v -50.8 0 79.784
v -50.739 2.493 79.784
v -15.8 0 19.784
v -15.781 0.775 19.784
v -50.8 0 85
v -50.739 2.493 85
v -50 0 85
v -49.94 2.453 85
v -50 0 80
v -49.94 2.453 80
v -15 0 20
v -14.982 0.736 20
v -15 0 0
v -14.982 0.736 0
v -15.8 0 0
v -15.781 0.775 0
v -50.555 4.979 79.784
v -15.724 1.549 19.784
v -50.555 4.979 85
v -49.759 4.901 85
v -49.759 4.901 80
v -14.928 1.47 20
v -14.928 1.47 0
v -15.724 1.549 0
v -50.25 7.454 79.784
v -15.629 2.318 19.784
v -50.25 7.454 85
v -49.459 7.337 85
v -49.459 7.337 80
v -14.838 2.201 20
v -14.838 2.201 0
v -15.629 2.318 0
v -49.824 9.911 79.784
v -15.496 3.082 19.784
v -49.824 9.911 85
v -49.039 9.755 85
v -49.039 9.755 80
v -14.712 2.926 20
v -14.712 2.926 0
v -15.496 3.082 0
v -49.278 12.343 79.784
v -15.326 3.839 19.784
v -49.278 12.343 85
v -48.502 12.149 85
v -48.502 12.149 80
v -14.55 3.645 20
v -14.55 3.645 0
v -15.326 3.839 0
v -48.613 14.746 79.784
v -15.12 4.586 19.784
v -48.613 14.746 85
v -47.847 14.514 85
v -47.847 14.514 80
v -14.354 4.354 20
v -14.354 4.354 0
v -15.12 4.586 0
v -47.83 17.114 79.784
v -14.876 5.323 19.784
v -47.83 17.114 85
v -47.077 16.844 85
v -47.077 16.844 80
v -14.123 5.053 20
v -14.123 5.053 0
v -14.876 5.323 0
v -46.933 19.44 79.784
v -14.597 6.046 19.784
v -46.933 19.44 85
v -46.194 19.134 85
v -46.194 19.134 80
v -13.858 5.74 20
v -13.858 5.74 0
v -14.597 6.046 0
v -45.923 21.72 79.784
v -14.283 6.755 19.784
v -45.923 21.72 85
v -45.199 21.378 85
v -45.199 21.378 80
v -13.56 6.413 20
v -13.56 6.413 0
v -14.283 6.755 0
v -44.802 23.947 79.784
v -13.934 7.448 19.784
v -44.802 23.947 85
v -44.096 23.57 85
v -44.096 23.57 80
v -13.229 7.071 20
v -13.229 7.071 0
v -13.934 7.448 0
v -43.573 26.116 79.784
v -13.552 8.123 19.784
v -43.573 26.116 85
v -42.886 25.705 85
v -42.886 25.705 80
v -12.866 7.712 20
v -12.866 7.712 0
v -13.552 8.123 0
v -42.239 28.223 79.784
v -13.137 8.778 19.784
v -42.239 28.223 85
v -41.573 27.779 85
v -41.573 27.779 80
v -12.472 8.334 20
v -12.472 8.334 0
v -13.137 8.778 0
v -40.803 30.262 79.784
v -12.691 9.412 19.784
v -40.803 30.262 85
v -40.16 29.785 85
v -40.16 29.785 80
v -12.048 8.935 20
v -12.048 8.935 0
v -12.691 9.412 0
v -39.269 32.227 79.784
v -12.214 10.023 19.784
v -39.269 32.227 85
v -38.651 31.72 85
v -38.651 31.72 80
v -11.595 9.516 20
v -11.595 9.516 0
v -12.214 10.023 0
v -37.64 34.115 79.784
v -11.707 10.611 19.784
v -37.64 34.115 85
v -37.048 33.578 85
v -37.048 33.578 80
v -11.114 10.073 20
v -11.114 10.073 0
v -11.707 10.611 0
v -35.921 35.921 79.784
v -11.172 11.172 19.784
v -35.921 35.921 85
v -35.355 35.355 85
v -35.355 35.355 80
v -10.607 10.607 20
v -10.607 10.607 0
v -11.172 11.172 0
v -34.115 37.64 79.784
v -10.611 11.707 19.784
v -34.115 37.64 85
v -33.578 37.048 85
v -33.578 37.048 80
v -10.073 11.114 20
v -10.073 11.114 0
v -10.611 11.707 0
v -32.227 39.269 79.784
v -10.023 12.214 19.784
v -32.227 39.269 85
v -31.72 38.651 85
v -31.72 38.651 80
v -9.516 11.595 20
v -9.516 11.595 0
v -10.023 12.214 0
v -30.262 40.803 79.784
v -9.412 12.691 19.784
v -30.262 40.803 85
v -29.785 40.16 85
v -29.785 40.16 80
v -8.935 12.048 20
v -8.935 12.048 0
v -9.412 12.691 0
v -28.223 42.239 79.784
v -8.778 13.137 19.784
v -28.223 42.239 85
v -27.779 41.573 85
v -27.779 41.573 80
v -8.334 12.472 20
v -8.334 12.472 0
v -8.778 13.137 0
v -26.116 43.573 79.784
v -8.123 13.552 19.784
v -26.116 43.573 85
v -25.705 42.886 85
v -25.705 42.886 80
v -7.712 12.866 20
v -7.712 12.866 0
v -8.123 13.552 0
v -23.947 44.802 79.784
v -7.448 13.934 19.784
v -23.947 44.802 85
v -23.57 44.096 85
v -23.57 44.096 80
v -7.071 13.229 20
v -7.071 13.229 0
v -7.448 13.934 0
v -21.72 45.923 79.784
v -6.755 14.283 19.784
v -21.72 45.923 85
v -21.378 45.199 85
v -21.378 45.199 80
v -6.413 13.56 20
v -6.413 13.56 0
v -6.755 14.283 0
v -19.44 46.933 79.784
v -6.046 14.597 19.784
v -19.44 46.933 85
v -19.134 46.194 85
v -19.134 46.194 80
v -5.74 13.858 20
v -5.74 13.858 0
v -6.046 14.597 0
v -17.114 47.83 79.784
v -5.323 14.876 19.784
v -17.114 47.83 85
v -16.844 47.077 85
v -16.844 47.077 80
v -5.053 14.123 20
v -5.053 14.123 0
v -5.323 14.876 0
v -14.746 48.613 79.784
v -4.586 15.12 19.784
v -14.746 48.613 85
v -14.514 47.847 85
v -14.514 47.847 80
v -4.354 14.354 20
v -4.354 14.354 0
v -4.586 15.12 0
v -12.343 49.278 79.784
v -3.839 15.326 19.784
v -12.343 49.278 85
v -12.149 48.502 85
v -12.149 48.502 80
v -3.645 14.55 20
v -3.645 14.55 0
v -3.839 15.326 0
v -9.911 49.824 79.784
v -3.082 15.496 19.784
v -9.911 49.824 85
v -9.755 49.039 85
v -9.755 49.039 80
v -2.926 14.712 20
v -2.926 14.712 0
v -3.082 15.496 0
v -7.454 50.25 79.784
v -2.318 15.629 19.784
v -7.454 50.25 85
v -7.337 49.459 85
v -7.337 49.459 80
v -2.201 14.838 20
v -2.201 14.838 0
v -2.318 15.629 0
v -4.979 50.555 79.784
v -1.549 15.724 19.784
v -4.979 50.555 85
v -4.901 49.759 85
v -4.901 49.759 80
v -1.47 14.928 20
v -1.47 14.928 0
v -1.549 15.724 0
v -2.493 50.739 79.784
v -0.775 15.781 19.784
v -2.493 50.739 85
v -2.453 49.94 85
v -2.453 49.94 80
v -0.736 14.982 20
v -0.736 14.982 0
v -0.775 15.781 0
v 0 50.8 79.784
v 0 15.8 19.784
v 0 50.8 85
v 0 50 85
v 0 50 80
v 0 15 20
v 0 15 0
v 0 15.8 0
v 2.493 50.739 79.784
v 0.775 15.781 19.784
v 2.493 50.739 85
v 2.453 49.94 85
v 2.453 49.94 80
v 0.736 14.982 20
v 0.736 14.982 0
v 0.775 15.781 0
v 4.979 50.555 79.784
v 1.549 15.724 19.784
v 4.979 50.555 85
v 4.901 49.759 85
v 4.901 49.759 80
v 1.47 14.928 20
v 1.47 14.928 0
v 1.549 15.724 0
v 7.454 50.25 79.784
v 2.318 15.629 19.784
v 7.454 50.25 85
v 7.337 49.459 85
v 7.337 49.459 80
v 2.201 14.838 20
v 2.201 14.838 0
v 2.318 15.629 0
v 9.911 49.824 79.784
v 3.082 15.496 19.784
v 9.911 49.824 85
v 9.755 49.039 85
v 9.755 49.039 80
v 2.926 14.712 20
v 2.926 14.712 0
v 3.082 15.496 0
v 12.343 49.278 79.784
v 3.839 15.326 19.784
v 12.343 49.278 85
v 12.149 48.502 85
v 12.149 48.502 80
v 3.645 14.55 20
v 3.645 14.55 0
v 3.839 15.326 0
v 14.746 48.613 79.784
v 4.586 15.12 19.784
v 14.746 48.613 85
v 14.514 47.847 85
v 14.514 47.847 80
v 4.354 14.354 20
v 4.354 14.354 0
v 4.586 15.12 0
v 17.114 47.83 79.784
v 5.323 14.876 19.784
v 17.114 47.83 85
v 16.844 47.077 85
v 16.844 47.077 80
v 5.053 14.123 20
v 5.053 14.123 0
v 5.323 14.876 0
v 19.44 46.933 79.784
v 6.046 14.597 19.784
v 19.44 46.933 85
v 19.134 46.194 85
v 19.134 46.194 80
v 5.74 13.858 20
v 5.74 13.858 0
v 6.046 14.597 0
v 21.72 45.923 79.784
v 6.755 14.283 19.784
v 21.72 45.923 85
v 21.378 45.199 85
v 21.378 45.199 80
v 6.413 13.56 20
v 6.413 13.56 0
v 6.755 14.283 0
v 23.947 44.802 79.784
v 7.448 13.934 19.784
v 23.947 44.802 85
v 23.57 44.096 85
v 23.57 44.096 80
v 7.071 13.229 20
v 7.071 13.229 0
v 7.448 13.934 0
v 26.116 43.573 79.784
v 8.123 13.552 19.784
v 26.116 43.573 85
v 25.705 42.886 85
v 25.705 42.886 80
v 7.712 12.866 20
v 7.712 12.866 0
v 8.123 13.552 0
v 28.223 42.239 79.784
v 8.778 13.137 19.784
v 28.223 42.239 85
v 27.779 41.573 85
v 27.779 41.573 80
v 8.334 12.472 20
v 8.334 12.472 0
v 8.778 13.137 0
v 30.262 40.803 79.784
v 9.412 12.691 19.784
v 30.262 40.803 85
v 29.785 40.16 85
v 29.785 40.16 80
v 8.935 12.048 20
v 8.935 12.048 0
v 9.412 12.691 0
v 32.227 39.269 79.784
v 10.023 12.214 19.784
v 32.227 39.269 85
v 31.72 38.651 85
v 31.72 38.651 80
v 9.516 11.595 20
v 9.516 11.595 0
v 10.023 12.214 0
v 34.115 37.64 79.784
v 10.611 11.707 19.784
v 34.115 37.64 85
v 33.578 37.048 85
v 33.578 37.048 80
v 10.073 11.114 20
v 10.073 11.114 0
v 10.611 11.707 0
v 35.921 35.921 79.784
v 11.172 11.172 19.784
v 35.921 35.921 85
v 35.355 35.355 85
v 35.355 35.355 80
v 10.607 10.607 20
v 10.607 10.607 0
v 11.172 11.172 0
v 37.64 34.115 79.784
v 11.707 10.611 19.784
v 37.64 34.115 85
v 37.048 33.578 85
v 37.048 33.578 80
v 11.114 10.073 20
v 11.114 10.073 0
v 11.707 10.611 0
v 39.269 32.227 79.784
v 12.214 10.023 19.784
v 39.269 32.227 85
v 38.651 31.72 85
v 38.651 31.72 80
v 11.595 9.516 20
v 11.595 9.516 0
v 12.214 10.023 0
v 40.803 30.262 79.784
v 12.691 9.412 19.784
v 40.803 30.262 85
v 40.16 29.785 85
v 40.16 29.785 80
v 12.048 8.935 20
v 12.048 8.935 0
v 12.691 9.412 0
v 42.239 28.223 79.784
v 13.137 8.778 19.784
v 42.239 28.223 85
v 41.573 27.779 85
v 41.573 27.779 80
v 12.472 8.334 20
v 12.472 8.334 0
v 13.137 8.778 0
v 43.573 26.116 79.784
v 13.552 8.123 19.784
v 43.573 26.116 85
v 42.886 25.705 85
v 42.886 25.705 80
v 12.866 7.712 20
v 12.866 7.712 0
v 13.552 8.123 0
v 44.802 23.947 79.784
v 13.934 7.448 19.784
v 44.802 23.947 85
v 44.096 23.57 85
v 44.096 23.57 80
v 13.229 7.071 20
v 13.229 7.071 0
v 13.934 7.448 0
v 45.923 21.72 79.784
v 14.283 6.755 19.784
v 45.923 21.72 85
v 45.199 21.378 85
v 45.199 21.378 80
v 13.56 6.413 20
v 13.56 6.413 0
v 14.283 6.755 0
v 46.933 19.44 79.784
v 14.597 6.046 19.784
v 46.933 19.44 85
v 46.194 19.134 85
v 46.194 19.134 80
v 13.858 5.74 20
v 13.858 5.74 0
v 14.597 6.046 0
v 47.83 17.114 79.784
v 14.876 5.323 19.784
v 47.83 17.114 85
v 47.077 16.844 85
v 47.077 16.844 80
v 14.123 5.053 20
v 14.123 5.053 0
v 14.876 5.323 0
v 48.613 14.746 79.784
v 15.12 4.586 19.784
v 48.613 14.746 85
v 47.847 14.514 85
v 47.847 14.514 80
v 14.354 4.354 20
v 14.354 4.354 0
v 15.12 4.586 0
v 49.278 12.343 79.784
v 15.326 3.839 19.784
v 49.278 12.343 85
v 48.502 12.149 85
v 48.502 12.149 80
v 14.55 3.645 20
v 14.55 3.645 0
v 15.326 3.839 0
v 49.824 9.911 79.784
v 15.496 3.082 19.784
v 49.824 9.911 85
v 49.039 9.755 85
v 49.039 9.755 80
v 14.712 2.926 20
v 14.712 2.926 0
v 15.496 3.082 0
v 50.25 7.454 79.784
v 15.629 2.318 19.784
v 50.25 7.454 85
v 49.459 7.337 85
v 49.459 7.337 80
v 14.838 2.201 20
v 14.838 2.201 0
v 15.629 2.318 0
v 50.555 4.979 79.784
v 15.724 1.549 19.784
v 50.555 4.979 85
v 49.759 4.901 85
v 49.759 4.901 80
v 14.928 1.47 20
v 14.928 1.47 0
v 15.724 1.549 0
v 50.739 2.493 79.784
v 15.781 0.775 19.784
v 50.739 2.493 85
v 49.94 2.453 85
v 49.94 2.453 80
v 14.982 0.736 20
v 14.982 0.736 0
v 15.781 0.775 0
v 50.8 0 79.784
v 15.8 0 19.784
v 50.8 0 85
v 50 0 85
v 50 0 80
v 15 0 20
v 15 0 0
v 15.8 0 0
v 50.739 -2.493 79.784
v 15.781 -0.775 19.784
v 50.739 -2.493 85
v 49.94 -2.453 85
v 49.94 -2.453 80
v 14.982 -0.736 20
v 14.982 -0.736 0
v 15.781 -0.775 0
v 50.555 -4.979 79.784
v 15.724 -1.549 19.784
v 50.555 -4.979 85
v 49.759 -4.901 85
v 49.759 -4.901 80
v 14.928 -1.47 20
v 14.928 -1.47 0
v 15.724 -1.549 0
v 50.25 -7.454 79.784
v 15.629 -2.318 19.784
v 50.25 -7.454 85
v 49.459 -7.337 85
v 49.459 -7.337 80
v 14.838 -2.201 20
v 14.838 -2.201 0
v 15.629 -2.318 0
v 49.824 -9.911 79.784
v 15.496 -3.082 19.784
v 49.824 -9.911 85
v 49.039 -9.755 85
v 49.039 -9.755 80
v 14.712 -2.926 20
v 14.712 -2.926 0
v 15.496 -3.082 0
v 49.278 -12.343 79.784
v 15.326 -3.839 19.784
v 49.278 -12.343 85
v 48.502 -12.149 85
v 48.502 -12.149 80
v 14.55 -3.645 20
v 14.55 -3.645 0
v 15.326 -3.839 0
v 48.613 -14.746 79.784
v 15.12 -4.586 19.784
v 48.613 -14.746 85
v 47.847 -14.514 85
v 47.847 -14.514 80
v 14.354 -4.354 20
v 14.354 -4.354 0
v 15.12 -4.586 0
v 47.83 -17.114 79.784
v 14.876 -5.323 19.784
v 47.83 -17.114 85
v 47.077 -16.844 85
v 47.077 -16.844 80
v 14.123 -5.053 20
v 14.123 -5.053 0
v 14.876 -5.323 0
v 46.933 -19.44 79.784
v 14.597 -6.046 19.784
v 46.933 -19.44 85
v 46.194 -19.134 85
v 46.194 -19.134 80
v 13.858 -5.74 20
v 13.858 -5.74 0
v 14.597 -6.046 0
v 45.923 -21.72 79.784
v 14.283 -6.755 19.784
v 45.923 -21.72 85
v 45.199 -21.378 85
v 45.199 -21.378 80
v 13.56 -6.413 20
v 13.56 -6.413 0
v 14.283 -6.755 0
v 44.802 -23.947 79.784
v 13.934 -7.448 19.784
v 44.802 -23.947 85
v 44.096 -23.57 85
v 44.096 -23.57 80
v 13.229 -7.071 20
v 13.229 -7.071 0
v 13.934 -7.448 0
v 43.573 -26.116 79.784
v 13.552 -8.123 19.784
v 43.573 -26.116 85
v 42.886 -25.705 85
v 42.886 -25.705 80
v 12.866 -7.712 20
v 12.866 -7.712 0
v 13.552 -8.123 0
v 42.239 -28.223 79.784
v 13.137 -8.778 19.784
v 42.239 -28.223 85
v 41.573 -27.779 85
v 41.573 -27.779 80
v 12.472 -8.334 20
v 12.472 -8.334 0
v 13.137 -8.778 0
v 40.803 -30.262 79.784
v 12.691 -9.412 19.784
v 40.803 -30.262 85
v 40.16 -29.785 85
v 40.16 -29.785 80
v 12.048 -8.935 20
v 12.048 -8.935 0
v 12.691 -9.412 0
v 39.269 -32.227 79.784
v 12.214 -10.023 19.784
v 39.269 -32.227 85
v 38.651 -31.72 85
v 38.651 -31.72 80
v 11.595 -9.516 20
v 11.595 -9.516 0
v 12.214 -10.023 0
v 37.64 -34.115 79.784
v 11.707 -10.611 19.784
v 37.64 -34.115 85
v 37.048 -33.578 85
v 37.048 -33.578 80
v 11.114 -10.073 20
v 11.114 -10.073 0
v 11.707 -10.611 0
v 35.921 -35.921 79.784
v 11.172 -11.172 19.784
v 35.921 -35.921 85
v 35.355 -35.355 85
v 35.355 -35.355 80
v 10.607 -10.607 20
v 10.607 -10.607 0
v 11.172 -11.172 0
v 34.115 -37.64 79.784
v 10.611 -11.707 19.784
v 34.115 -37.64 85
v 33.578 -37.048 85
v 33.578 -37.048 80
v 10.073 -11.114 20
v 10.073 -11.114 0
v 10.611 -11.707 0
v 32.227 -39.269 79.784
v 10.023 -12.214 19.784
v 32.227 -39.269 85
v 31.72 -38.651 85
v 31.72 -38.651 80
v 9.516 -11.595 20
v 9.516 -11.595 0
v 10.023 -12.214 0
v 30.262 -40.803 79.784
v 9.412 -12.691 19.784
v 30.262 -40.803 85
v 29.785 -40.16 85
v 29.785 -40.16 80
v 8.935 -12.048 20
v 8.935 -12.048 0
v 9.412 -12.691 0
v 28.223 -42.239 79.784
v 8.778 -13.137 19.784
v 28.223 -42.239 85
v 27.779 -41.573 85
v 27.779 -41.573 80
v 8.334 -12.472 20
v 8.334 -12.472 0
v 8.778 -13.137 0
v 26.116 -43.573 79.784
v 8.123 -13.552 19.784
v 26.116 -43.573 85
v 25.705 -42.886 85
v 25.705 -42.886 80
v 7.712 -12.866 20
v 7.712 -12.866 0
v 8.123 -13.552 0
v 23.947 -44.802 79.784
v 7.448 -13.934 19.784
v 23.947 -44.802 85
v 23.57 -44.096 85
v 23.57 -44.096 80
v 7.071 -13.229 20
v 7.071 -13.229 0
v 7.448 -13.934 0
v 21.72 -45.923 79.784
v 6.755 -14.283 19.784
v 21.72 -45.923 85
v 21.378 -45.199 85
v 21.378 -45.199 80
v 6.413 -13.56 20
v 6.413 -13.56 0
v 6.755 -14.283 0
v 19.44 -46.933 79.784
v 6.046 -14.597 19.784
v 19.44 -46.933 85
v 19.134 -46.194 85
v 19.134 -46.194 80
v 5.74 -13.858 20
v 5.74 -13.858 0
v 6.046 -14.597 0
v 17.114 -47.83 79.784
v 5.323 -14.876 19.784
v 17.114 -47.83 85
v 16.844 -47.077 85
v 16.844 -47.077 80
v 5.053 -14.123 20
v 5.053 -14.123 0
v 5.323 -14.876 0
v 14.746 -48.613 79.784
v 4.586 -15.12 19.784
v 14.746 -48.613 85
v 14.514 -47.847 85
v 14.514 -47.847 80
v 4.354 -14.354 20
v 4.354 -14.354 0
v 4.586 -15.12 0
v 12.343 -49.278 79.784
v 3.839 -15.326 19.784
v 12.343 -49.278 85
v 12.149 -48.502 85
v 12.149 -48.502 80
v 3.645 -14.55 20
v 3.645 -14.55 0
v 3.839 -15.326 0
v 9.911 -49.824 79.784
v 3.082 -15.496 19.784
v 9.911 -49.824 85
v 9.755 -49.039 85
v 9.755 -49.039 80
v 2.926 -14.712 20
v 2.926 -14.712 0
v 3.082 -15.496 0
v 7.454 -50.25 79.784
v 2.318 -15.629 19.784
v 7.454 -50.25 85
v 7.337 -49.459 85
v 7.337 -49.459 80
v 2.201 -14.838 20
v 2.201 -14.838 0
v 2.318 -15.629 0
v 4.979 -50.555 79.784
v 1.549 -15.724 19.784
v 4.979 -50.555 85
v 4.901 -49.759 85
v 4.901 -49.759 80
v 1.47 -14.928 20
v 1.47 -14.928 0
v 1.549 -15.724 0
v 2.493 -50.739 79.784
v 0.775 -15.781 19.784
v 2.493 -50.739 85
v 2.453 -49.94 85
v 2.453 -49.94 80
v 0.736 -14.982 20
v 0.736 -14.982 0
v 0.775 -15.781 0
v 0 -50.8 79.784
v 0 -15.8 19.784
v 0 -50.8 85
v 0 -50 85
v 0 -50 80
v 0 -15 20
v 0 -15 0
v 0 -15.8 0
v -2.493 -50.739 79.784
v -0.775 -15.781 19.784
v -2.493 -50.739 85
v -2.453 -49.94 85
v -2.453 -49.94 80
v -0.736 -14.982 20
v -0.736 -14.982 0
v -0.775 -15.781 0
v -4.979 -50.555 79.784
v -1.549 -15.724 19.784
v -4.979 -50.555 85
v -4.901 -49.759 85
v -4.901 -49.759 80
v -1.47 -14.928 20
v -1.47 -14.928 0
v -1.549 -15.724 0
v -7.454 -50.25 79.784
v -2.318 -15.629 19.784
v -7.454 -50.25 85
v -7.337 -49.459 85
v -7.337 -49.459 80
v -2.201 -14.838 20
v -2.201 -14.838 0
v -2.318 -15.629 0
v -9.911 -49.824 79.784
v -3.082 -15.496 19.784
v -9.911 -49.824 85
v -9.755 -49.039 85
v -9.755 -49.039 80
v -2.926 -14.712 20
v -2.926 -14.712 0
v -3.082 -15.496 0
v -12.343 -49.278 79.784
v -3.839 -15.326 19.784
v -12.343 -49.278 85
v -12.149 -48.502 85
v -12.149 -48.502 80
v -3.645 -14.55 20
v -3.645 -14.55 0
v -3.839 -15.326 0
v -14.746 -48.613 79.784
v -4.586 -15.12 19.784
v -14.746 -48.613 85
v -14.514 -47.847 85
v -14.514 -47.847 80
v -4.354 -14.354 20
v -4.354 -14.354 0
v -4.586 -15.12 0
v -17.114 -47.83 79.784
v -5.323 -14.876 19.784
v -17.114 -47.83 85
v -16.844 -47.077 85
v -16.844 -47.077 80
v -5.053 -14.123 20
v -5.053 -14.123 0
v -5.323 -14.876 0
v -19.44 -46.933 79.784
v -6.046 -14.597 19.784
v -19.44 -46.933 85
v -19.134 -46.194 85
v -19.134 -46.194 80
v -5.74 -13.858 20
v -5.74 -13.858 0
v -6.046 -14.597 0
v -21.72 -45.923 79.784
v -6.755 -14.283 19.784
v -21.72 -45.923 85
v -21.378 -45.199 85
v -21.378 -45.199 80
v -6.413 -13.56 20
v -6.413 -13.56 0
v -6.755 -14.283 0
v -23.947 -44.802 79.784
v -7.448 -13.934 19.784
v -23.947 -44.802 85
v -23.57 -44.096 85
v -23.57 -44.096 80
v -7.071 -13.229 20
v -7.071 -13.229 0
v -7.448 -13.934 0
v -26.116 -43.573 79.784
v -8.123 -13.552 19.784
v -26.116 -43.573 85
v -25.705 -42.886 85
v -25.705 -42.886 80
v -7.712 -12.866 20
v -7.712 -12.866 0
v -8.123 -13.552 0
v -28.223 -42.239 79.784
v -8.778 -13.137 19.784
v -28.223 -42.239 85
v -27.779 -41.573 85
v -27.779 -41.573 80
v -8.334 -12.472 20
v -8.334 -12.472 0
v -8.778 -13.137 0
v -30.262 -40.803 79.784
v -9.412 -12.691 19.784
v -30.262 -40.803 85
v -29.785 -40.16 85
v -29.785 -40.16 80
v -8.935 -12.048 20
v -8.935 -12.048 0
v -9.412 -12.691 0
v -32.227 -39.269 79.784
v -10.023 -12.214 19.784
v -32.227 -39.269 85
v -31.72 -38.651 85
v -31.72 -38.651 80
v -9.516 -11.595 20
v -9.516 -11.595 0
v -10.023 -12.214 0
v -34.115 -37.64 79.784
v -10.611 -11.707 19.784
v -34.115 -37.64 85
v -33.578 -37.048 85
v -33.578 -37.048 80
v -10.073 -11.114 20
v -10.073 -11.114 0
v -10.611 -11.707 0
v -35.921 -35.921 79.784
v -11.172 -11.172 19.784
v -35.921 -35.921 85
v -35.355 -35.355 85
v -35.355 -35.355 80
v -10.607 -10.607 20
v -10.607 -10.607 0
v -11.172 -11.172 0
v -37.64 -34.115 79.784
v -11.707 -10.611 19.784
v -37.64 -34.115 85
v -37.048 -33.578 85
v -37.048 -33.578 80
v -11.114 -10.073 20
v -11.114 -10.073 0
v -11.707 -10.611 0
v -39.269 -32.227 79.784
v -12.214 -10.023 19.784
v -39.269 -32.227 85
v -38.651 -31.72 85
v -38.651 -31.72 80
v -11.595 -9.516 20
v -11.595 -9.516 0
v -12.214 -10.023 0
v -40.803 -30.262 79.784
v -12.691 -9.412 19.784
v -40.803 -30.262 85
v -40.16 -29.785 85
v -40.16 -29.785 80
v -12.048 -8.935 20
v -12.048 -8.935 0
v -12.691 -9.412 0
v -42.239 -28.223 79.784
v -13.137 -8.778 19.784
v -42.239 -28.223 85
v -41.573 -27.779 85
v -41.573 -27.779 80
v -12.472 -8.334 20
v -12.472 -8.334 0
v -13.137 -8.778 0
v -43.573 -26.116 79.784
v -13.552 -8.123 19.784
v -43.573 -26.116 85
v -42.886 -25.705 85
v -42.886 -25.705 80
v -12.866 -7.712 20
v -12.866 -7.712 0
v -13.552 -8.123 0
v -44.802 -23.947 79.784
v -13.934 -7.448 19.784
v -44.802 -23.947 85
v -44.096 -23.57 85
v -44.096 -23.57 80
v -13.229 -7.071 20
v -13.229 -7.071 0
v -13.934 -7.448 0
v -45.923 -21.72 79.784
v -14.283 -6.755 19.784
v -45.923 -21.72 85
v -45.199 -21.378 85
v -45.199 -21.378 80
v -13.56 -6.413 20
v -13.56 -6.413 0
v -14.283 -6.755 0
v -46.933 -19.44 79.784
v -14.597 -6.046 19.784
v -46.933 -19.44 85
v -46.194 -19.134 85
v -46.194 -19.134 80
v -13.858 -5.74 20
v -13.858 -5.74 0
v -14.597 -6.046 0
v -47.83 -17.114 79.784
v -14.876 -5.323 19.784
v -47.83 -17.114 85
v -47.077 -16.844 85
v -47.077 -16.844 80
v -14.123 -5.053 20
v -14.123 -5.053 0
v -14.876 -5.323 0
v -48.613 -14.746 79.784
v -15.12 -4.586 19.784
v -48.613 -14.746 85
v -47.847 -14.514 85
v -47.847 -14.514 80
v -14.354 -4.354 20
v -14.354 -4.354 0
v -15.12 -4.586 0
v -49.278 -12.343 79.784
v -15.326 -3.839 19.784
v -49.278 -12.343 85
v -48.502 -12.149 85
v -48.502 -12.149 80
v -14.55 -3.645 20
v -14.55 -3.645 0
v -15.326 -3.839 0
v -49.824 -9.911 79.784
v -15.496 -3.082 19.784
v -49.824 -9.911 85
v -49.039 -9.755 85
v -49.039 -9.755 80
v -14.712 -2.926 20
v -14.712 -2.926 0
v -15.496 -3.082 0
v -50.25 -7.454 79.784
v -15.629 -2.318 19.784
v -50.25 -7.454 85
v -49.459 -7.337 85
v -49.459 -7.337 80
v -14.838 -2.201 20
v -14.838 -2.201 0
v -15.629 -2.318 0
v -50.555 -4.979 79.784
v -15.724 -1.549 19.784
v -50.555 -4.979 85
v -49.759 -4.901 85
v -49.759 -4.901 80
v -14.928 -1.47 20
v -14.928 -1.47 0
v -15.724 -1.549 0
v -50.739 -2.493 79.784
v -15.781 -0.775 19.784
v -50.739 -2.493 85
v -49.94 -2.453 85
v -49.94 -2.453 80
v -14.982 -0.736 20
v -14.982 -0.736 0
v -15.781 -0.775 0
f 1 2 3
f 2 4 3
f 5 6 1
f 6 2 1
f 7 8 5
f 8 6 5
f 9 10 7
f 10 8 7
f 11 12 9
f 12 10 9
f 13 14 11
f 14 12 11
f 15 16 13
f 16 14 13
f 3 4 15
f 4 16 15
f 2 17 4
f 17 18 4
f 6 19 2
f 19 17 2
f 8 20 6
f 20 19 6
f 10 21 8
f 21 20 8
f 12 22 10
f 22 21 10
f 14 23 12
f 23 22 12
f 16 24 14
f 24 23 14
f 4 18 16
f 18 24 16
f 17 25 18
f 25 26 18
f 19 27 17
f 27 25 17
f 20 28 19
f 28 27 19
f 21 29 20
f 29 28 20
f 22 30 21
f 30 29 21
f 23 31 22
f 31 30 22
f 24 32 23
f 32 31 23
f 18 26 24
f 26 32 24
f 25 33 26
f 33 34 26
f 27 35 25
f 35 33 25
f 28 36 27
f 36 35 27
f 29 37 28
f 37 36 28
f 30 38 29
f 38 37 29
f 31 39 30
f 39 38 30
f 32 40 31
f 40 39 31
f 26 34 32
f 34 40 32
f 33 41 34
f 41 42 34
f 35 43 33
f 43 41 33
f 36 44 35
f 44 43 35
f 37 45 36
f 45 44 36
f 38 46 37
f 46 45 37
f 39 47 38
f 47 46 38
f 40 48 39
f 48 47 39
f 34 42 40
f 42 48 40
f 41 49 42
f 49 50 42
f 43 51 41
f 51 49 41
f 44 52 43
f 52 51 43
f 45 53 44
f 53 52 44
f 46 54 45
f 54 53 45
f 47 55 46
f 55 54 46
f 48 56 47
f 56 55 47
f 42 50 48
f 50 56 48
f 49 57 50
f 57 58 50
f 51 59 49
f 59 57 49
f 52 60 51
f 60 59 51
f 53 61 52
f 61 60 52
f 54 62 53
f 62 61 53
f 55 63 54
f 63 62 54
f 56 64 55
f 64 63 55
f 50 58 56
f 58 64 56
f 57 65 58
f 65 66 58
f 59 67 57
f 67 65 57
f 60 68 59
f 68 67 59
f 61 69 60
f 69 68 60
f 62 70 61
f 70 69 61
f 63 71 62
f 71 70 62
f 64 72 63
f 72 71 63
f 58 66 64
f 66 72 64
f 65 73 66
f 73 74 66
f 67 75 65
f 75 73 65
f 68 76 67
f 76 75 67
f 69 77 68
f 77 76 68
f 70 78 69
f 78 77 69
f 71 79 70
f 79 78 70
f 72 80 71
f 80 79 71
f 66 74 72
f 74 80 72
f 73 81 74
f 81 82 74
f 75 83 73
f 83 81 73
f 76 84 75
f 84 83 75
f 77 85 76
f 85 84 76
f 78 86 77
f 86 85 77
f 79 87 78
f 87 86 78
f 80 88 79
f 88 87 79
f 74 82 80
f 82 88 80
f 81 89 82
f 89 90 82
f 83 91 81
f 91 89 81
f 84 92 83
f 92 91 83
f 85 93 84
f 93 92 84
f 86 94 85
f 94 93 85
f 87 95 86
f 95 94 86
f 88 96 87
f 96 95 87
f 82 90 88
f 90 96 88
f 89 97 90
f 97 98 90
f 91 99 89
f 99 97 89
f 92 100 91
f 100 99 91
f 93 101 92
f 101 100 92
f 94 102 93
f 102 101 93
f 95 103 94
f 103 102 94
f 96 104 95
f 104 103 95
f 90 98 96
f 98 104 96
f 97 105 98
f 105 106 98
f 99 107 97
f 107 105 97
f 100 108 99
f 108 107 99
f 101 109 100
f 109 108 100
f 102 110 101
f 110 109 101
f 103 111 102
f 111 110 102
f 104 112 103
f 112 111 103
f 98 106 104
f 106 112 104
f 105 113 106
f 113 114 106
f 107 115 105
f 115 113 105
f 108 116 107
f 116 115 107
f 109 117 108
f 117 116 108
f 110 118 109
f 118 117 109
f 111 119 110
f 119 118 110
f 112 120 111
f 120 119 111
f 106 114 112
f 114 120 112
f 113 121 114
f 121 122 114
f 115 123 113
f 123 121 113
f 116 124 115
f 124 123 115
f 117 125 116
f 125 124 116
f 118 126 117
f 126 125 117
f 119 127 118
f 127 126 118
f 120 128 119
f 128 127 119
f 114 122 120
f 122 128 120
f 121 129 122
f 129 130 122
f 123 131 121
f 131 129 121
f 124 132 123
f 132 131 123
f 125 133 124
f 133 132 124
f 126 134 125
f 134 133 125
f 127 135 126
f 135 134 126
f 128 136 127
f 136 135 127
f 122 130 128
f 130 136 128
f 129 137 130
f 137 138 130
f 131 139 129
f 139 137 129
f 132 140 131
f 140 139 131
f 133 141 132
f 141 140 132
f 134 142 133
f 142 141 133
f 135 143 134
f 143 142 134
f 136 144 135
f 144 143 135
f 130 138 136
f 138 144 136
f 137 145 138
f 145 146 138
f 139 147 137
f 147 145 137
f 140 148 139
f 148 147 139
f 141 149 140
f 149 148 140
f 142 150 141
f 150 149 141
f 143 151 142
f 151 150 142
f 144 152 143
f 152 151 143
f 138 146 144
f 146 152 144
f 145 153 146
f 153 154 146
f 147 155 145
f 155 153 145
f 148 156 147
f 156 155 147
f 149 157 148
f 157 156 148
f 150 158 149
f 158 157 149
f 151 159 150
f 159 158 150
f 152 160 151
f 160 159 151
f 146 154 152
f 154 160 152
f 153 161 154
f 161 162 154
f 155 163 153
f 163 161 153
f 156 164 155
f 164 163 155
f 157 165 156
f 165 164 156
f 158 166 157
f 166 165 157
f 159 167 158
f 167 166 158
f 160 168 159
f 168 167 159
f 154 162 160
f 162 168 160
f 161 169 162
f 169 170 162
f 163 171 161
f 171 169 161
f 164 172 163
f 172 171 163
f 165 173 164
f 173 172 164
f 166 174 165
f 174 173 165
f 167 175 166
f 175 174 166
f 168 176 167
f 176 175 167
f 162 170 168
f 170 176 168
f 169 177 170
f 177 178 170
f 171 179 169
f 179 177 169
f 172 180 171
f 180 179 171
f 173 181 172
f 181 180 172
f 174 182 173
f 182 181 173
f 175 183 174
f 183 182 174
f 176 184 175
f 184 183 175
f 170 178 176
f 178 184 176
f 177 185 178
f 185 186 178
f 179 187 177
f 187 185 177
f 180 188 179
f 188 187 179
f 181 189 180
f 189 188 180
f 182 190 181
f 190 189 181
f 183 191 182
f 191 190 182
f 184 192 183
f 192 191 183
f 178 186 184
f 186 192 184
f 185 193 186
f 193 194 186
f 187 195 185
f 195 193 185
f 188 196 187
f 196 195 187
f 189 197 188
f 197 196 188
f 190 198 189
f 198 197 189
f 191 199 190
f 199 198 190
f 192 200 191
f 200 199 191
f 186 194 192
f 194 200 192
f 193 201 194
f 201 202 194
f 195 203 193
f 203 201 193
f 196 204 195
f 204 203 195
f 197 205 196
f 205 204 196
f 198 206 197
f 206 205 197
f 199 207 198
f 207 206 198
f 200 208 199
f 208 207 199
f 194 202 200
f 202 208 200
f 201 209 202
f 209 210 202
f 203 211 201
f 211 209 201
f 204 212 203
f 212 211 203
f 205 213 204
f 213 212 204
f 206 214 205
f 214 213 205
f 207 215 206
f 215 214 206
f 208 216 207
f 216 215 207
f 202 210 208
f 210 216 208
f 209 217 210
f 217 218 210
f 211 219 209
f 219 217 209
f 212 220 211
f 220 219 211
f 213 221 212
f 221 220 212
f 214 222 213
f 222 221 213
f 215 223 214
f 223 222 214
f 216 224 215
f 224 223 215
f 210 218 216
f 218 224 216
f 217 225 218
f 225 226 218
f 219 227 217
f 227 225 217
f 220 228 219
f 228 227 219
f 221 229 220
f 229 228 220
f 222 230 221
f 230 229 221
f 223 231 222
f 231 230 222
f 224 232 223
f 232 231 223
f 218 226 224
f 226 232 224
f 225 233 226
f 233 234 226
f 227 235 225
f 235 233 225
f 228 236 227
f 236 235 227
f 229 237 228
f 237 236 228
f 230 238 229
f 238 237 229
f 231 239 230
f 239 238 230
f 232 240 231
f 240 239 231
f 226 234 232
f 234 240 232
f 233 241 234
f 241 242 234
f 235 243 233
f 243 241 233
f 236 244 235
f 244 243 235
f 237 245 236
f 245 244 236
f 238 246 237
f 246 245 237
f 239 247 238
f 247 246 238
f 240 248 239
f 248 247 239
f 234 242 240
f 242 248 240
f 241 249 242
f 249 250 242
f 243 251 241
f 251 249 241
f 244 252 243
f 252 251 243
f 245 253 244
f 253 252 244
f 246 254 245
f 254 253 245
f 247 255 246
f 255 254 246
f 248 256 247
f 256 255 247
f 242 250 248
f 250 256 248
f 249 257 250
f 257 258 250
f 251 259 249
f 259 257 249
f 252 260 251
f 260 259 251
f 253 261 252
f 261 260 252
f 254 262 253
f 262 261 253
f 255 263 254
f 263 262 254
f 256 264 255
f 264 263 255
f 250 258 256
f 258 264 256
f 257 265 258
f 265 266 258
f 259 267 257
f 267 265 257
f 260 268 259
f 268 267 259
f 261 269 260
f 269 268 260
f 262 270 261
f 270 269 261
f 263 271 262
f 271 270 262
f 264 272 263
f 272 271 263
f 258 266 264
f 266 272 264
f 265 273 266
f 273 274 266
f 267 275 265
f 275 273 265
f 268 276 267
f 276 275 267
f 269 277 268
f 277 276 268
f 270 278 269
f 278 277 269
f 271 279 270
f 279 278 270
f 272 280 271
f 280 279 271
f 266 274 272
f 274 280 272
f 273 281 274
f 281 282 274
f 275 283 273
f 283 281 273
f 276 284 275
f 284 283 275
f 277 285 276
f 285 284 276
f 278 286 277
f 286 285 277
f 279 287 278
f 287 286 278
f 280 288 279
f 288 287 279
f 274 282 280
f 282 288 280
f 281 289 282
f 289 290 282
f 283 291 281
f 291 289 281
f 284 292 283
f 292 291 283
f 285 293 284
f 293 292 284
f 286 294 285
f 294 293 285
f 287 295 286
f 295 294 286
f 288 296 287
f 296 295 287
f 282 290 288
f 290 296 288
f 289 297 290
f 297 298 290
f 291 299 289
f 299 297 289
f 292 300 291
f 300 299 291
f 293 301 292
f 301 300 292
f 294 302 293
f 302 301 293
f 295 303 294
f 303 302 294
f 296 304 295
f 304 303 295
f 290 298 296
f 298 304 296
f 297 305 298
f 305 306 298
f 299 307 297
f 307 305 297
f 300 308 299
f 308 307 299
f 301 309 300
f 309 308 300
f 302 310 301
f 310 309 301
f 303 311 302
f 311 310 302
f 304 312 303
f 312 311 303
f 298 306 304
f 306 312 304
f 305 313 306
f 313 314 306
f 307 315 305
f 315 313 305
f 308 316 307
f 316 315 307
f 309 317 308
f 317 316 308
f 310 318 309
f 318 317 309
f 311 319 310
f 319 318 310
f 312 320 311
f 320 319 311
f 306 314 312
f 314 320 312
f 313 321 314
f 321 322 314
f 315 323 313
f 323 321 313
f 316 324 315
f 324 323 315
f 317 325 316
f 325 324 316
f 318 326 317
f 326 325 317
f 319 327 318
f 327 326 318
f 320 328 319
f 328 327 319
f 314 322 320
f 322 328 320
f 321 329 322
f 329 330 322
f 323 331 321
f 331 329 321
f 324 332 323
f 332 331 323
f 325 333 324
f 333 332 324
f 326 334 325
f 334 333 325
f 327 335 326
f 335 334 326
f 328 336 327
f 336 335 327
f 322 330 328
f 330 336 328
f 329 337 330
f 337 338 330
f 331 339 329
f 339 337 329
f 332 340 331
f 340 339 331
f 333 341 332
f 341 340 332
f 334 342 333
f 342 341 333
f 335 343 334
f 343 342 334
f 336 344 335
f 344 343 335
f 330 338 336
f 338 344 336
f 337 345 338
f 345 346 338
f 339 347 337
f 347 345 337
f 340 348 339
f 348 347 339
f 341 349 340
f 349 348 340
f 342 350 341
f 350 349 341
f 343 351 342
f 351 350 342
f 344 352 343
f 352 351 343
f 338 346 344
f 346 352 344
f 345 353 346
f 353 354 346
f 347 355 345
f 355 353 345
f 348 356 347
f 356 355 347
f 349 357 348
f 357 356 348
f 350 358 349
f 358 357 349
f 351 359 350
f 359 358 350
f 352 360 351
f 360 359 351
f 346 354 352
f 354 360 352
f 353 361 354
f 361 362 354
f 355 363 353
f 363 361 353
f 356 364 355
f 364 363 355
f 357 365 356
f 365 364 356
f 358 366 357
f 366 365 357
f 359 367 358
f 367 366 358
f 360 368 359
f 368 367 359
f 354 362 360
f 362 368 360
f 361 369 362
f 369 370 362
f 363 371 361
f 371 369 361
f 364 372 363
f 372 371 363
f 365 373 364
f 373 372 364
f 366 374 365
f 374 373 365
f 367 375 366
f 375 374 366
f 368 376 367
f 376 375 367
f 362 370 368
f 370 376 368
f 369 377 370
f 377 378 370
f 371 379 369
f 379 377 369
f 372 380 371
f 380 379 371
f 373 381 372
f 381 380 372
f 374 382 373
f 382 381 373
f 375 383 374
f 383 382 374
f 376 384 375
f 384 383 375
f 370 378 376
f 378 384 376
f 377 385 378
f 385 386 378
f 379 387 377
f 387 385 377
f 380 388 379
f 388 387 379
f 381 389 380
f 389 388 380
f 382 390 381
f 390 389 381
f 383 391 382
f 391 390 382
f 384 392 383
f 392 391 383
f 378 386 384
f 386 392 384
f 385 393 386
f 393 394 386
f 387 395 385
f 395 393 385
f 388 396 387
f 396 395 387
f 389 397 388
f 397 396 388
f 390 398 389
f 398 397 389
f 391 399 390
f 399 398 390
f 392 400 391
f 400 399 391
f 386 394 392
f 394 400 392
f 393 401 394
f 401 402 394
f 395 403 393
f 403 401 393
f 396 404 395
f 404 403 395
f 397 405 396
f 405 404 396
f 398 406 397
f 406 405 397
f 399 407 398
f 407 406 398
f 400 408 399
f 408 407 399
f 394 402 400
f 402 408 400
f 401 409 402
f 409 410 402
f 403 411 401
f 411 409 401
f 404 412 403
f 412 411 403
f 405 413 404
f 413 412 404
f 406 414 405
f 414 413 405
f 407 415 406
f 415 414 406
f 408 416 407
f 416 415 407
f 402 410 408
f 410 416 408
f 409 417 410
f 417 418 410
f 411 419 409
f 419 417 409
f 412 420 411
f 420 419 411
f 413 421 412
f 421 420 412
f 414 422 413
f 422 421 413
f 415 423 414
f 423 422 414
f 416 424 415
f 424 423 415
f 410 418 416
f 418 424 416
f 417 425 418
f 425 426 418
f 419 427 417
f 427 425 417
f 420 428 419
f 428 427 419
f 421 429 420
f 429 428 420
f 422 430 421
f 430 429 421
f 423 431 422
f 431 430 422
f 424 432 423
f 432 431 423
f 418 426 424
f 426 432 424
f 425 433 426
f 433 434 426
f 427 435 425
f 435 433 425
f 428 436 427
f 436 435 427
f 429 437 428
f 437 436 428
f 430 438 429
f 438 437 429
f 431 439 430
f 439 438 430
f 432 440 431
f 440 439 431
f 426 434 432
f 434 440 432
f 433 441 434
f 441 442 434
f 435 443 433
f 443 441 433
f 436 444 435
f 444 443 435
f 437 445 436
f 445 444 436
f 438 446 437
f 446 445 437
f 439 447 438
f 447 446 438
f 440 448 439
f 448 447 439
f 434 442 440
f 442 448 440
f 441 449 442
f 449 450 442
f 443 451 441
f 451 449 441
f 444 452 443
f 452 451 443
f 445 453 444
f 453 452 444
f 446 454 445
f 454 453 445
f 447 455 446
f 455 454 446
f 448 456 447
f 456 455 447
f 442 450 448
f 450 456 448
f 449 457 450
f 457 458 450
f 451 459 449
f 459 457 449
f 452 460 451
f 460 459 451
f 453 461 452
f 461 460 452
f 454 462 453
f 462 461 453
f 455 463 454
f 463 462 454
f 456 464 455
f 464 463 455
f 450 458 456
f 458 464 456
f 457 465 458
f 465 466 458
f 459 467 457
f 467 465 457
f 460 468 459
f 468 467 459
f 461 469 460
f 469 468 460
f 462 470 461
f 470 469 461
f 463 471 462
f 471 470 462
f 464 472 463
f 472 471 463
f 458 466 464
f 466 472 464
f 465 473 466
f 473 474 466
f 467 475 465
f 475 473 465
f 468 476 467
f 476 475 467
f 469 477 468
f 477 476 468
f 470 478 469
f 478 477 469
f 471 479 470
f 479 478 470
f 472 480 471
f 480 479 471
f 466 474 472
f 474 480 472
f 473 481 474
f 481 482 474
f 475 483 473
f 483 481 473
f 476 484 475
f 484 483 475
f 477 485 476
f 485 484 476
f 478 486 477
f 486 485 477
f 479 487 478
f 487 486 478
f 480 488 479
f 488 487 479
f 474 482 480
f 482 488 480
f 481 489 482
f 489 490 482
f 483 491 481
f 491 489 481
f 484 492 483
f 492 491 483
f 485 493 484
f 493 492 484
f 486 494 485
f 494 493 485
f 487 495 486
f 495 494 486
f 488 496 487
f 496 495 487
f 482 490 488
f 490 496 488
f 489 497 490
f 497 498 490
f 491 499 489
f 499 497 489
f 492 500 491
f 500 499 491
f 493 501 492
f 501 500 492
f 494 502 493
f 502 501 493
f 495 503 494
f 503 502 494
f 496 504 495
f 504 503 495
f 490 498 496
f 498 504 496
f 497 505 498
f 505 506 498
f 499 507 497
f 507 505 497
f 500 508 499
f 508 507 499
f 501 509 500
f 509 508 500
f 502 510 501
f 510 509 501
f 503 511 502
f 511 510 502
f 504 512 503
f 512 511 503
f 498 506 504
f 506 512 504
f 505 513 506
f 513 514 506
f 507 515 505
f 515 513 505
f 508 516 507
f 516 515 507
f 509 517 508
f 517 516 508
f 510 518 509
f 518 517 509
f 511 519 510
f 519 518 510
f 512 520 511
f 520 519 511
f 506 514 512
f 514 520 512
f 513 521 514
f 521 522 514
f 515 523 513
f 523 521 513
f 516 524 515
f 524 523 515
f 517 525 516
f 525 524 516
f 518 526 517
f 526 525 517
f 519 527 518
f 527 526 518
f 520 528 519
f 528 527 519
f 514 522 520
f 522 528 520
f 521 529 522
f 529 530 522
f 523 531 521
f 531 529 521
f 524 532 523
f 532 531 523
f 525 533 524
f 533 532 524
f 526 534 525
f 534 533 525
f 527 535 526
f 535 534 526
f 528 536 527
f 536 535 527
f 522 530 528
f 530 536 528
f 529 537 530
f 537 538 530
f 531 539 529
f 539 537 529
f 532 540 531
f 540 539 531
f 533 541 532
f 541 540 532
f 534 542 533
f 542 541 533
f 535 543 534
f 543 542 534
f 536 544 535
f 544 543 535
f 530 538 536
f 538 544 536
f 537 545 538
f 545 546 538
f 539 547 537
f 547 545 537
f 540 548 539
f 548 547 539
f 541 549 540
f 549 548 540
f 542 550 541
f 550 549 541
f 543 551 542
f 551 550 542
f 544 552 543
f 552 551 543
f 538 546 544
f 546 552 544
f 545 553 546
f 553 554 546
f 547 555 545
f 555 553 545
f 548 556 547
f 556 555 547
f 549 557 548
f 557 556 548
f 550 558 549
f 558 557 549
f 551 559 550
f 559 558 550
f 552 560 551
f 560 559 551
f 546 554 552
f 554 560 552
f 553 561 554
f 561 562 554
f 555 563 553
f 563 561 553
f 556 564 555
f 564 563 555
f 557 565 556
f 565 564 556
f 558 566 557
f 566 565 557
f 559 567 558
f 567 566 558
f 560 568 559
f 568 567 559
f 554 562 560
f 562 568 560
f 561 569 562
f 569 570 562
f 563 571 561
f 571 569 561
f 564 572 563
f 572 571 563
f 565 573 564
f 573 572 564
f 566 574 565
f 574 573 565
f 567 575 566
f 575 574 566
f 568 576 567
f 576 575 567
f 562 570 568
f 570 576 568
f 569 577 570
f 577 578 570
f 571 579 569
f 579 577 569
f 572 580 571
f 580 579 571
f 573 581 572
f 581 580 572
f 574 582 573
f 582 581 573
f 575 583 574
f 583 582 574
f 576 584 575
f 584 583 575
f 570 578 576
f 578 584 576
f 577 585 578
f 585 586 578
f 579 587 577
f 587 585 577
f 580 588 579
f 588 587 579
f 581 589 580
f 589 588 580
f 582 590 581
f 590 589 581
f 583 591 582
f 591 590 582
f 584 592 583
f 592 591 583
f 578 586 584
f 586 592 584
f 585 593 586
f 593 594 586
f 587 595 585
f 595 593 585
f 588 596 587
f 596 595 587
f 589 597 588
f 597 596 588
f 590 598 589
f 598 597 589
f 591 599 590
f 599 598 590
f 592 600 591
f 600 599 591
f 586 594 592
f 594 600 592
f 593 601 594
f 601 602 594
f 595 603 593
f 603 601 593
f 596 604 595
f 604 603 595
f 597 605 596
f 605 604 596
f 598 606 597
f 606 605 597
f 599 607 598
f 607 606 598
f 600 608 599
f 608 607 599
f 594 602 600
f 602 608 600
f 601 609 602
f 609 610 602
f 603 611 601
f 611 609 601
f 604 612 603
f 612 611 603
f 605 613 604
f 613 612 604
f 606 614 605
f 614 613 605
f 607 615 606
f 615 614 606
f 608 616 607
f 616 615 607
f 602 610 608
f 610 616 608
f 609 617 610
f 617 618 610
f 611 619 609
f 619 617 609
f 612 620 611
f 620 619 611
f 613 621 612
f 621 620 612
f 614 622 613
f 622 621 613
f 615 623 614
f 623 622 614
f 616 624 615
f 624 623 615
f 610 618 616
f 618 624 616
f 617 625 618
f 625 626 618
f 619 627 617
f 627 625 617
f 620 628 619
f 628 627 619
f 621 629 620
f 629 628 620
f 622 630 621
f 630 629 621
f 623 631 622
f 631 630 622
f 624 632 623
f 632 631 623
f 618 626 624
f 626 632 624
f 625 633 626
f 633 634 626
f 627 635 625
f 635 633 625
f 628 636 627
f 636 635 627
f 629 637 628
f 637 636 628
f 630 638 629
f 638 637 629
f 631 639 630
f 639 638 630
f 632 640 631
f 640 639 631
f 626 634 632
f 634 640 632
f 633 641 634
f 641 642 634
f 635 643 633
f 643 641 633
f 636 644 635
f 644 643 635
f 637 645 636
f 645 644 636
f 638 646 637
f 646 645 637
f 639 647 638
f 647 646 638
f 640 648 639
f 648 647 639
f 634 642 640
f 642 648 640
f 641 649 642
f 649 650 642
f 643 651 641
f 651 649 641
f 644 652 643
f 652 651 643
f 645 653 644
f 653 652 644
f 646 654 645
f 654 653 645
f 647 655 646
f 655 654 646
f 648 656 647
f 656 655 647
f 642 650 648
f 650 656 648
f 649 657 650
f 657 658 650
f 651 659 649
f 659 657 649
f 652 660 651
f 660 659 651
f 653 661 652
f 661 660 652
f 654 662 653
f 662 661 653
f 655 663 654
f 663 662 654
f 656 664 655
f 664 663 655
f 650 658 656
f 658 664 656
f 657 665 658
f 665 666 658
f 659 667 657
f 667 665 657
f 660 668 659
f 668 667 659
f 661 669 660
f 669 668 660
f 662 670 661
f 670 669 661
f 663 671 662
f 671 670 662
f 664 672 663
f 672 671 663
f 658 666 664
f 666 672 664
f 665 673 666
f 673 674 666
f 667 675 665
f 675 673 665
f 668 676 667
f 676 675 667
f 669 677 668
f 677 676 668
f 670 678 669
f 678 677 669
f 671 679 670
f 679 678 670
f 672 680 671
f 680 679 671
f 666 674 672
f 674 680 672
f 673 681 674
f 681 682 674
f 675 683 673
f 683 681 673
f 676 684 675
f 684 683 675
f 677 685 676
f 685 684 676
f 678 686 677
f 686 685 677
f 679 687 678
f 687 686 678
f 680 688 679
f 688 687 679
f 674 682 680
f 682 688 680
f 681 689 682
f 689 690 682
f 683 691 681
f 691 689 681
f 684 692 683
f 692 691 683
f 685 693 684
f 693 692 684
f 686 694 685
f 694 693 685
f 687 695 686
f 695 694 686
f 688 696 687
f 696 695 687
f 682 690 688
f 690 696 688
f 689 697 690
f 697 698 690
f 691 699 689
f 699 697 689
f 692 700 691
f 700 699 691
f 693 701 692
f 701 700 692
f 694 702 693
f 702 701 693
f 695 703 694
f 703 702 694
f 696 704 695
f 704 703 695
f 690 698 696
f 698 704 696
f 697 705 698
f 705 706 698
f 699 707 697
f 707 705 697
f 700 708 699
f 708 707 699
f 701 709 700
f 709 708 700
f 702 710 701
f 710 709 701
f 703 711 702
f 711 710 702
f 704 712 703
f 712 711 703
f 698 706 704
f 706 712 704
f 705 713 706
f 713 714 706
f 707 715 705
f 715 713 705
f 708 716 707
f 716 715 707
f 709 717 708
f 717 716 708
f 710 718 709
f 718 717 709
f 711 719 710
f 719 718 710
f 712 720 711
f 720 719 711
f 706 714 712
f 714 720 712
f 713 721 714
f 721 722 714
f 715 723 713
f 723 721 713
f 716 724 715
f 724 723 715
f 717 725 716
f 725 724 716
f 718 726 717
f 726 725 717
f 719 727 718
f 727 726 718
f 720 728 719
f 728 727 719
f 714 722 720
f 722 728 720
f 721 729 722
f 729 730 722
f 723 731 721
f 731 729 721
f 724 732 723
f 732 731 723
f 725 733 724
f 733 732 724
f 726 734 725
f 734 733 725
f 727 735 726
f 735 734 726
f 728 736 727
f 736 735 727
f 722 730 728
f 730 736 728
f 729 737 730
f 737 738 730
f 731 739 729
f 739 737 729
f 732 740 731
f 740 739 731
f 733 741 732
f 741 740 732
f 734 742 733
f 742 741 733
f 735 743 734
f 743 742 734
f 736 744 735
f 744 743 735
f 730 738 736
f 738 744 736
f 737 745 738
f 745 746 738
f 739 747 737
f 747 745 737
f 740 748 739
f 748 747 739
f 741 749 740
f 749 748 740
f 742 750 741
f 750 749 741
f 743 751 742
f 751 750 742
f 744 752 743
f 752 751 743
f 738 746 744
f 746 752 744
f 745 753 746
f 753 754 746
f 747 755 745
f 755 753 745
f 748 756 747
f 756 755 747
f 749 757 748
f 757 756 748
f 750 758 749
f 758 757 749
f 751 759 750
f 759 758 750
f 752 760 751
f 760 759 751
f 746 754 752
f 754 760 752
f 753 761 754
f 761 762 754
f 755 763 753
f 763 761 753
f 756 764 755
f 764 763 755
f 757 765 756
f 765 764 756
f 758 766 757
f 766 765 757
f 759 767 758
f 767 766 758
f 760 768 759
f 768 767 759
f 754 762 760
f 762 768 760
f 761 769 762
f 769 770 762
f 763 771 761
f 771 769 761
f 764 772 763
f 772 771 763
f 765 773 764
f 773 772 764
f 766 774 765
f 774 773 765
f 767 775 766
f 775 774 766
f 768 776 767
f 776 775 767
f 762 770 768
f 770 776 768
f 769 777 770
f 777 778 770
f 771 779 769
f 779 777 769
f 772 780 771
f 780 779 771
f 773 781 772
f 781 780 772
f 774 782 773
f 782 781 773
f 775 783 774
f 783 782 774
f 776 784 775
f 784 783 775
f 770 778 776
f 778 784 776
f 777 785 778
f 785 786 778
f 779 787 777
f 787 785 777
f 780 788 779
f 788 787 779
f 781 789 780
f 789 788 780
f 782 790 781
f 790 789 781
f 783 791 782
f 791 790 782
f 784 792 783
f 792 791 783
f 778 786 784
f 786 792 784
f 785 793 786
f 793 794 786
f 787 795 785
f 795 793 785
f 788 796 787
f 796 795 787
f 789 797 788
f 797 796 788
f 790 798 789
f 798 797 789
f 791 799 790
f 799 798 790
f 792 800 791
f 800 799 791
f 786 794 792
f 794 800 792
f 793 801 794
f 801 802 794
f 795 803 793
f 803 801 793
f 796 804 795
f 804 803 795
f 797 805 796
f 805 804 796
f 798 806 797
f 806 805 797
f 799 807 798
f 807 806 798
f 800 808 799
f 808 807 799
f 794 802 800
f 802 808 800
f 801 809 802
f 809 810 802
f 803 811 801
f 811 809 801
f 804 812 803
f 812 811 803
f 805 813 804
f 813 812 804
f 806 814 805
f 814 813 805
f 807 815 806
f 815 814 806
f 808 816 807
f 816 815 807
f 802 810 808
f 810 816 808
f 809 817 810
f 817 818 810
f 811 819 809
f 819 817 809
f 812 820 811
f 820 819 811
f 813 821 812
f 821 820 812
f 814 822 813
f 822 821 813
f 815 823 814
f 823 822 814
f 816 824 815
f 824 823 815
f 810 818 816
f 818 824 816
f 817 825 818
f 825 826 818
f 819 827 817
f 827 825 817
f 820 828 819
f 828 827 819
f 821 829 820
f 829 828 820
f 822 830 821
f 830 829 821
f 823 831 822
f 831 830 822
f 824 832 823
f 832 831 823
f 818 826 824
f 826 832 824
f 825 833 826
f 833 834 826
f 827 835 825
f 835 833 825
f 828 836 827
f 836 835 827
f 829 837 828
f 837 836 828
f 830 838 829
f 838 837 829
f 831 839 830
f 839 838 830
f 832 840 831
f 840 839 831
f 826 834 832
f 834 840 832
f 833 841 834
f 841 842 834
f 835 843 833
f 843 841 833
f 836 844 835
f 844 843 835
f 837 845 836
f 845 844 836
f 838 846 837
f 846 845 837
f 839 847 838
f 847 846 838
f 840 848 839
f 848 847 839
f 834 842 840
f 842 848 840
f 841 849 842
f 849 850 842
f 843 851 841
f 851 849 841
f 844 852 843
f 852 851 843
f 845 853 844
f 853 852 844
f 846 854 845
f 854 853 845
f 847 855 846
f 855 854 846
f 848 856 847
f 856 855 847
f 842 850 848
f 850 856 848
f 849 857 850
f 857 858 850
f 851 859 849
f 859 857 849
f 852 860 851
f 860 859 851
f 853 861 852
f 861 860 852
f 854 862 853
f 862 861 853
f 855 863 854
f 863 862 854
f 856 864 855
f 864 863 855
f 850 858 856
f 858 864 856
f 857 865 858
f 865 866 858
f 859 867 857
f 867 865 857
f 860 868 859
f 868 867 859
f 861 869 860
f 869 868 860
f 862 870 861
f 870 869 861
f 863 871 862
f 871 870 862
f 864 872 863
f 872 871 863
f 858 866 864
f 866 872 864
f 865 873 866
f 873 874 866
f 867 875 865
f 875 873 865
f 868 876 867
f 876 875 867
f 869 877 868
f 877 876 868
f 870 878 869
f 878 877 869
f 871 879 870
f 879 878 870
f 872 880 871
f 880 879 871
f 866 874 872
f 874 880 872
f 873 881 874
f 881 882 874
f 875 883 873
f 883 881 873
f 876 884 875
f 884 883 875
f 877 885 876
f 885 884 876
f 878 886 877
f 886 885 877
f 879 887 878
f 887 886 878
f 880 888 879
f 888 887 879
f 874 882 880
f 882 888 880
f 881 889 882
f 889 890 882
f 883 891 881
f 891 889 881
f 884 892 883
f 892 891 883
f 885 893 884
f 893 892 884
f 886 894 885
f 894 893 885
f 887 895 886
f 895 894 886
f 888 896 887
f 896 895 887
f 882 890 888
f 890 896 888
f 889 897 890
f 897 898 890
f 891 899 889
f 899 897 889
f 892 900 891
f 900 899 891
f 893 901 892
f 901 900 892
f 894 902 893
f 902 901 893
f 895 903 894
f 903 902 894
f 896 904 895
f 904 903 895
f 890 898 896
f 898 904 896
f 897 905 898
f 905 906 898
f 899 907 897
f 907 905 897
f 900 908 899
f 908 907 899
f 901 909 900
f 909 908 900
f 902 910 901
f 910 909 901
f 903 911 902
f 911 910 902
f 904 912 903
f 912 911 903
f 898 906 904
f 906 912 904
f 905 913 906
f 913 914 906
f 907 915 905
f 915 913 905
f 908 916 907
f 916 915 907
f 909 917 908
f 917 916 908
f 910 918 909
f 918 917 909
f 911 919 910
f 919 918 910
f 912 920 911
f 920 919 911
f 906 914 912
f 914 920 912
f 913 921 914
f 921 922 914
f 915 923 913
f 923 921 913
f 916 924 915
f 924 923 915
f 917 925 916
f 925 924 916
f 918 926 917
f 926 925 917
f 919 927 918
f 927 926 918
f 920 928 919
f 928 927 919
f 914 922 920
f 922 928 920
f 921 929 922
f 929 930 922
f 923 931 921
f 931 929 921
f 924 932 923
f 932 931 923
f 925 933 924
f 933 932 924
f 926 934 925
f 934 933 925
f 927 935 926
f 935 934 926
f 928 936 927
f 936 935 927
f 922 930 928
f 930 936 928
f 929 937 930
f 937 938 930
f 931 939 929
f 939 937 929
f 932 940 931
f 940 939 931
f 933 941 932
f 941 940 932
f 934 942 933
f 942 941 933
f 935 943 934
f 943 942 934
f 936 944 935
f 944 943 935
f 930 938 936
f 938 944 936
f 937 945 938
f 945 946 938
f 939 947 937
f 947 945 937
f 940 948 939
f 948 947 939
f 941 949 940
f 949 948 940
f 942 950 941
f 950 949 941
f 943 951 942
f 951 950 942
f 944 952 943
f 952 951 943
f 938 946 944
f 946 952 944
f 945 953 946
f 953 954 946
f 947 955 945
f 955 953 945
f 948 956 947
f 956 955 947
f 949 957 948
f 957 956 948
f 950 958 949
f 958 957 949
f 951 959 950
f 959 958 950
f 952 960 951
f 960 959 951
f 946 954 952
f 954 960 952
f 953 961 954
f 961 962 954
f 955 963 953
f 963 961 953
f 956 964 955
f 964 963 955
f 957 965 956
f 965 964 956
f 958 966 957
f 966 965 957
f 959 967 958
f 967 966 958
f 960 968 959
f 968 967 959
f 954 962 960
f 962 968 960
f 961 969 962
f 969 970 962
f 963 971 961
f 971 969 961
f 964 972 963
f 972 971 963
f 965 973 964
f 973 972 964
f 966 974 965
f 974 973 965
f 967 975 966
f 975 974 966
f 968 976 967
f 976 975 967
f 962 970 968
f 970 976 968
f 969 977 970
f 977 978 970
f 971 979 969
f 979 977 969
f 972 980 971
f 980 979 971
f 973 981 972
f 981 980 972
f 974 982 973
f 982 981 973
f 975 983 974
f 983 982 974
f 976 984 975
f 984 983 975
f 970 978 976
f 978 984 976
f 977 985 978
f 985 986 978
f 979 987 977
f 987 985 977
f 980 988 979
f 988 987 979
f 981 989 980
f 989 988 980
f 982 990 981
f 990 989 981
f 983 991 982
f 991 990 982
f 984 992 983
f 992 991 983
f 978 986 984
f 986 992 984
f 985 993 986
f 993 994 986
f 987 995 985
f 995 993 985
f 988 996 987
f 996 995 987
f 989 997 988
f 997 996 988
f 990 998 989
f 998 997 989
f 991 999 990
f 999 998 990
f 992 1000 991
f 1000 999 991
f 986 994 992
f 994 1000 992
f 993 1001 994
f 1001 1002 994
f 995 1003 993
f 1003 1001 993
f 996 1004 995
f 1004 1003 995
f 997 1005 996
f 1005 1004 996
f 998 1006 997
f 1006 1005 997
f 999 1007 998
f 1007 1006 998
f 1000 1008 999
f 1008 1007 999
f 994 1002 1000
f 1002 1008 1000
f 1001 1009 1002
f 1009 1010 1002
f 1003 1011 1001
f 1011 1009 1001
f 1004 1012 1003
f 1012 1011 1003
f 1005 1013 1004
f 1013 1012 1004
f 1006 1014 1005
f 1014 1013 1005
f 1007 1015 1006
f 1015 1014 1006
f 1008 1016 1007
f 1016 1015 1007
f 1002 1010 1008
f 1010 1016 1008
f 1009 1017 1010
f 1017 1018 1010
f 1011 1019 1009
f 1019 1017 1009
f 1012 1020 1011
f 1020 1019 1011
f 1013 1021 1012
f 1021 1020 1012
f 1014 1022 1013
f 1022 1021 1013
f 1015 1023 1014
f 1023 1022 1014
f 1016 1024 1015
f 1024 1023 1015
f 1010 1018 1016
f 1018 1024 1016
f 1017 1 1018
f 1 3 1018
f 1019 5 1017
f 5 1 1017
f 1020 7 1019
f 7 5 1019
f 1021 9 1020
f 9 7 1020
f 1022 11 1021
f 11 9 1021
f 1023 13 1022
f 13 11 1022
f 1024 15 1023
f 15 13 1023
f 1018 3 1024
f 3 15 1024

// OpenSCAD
/**
 * @file funnel.scad
 * @brief Generate a funnel shape using the given parameters.
 * @author Cameron K. Brooks
 * @copyright 2025
 *
 * This file contains modules for generating a funnel shape using the given parameters.
 * Uses polygon() and rotate_extrude() to create the funnel shape in an efficient manner.
 *
 */

/* [Funnel] */
// Height of the cone (mm)
funnel_height = 60; // [10:1:200]
// Inside radius at the top of the cone (mm)
funnel_top_radius = 50; // [10:1:150]
// Height of the straight throat below the cone (mm)
throat_height = 20; // [5:1:100]
// Inside radius of the throat (mm)
throat_radius = 15; // [2:0.5:60]
// Wall thickness, square to the wall (mm)
wall_thickness = 0.8; // [0.4:0.1:4]
// Height of the straight rim above the cone (mm)
top_edge_height = 5; // [0:1:30]

funnel(
    funnel_height=funnel_height, funnel_top_radius=funnel_top_radius, throat_height=throat_height,
    throat_radius=throat_radius, wall_thickness=wall_thickness, top_edge_height=top_edge_height
);

/*
 * @brief Generate a funnel shape using the given parameters.
 *
 * @param funnel_height Height of the funnel section.
 * @param funnel_top_radius Inner radius of the funnel's top.
 * @param throat_height Vertical height of the throat section.
 * @param throat_radius Inner radius of the throat.
 * @param wall_thickness Thickness of the funnel wall, measured square to the wall.
 * @param top_edge_height Additional height at the funnel's top edge.
 * @param smoothness_segments Number of segments for a smooth rotation.
 */
module funnel(
    funnel_height,
    funnel_top_radius,
    throat_height,
    throat_radius,
    wall_thickness,
    top_edge_height,
    smoothness_segments = 128
) {
    rotate_extrude($fn=smoothness_segments)
        polygon(
            funnel_profile(
                funnel_height, funnel_top_radius, throat_height, throat_radius, wall_thickness,
                top_edge_height
            )
        );
}

/*
 * @brief The funnel's cross-section as [radius, height] points, inside wall
 * first from the bottom of the throat to the top edge, then back down the
 * outside.
 *
 * The outside of the sloped section is parallel to the inside and
 * wall_thickness away from it, so its corners sit below the inside ones by
 * wall_thickness * (slope length - funnel_height) / (top radius - throat radius).
 */
function funnel_profile(
    funnel_height,
    funnel_top_radius,
    throat_height,
    throat_radius,
    wall_thickness,
    top_edge_height
) =
    let (
        run = funnel_top_radius - throat_radius,
        slope = norm([run, funnel_height]),
        drop = wall_thickness * (slope - funnel_height) / run,
        top = throat_height + funnel_height + top_edge_height
    )
    assert(run > 0, "funnel_top_radius must be larger than throat_radius")
    assert(
        drop < throat_height, str(
            "throat_height must be more than ", drop,
            " mm, or the outside of the slope runs below the throat"
        )
    )
    [
        [throat_radius, 0],
        [throat_radius, throat_height],
        [funnel_top_radius, throat_height + funnel_height],
        [funnel_top_radius, top],
        [funnel_top_radius + wall_thickness, top],
        [funnel_top_radius + wall_thickness, throat_height + funnel_height - drop],
        [throat_radius + wall_thickness, throat_height - drop],
        [throat_radius + wall_thickness, 0],
    ];
